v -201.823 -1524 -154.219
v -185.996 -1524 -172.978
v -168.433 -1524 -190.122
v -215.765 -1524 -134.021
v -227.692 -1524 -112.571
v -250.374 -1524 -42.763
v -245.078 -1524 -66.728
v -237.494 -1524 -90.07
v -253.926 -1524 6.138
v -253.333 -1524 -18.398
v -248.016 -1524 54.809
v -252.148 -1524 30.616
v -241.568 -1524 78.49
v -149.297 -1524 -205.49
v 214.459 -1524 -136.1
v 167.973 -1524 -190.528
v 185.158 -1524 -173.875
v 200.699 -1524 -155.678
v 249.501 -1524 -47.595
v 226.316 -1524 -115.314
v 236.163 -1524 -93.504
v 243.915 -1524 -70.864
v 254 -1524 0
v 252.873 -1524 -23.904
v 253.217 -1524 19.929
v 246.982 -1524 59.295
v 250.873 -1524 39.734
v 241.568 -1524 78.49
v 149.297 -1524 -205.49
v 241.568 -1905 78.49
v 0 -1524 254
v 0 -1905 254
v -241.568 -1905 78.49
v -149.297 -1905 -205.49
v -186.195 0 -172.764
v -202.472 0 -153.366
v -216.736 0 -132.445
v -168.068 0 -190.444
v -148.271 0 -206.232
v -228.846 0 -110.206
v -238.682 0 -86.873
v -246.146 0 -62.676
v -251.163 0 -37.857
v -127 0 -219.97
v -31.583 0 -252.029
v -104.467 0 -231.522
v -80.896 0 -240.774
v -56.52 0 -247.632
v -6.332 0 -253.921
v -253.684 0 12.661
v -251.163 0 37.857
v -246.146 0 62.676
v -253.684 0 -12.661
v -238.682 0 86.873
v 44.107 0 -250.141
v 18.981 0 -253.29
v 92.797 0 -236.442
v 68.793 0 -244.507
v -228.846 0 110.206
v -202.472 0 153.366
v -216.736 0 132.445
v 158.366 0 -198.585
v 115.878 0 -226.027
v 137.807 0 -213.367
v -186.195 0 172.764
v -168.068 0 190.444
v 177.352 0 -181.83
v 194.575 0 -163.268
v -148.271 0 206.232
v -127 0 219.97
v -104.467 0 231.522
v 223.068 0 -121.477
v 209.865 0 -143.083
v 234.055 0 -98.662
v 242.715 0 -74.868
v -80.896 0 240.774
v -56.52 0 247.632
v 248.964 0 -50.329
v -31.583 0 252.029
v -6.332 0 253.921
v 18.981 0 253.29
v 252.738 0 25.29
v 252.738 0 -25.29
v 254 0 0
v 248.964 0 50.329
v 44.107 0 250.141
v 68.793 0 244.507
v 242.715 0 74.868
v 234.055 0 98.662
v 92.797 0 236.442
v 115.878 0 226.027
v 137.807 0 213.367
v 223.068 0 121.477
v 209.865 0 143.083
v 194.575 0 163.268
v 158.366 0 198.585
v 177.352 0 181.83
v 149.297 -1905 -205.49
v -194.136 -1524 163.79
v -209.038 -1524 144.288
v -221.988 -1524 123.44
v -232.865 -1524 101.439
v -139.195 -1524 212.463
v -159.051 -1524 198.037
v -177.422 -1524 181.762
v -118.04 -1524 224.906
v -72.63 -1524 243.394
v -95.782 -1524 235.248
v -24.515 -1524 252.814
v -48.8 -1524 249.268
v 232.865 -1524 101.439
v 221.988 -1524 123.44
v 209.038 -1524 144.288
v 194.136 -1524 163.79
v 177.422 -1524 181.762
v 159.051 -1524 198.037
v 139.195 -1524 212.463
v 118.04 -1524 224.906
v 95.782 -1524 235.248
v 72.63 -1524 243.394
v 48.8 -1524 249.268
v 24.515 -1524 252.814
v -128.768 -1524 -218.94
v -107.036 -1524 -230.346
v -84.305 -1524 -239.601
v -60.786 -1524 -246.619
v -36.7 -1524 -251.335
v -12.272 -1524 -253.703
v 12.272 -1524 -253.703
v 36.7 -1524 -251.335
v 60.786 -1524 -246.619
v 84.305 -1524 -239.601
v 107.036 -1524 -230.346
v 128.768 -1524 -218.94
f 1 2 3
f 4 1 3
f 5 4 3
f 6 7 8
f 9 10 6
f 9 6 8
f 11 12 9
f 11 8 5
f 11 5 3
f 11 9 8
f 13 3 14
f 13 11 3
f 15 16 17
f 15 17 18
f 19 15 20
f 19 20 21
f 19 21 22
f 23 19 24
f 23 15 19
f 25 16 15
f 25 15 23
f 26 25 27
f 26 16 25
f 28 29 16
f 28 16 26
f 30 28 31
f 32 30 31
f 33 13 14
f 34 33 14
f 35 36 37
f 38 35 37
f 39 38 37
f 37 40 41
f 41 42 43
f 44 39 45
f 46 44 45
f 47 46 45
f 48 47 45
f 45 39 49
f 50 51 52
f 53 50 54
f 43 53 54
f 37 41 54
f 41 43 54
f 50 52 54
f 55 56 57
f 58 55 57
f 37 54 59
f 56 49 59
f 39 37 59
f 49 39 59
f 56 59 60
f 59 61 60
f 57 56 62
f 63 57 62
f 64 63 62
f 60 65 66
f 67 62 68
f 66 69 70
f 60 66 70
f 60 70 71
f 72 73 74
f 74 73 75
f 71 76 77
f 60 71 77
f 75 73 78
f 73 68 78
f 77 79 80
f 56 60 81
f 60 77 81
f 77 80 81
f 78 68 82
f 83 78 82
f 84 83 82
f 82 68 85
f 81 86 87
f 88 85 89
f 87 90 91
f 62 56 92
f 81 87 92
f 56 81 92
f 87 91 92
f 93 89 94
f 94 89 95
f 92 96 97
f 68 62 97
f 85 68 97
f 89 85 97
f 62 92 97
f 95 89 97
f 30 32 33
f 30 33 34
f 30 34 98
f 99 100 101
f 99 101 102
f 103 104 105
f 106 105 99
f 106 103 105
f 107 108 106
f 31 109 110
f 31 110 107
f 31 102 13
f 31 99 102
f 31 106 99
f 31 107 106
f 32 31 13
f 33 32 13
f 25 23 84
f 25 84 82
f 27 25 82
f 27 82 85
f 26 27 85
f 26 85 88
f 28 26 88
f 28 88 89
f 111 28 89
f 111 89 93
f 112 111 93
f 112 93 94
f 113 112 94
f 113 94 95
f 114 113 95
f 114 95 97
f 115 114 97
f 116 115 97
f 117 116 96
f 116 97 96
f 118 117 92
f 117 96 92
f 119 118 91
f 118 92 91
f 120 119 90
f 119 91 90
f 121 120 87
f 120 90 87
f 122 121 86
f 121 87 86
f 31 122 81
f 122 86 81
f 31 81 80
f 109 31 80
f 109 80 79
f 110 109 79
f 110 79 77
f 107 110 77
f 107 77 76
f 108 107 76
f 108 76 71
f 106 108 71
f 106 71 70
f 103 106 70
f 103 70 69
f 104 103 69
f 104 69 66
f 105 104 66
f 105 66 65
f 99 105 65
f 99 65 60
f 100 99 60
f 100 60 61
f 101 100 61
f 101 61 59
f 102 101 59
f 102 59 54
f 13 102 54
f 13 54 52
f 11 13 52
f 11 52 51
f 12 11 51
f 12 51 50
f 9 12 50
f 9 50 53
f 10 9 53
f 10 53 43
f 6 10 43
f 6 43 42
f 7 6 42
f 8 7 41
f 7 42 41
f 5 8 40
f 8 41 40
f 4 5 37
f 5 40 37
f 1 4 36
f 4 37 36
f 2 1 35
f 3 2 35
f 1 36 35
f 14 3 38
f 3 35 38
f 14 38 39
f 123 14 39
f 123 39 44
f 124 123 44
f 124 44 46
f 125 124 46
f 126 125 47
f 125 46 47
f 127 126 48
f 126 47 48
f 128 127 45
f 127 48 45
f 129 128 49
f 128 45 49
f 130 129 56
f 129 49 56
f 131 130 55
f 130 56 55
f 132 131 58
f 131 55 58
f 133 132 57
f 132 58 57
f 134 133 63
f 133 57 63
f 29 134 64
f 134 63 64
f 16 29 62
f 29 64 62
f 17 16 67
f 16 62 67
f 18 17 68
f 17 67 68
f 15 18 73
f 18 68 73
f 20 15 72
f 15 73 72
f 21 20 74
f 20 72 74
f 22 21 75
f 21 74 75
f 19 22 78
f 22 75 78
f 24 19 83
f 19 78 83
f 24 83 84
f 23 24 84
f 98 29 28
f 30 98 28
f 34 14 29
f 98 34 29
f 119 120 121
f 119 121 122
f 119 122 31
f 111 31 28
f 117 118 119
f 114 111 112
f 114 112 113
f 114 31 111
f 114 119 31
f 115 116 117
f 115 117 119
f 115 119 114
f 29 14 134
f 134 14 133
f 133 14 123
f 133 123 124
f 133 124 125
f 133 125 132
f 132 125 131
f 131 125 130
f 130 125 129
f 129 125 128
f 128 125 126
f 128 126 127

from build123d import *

# Parameters (mm, degrees)
F0_R     = 254
F1_DEPTH = 1524
F3_DEPTH = 381


with BuildPart() as f1:
    # F0 (on Front) → F1 (new body)
    with BuildSketch(Plane.XZ):
        Circle(F0_R)
    extrude(amount=F1_DEPTH)

    # F2 (on face) → F3 (join)
    with BuildSketch(Plane.XZ.offset(1524)):
        Polygon((241.568355, 78.490317), (0, 254), (-241.568355, 78.490317), (-149.297454, -205.490317), (149.297454, -205.490317), align=None)
    extrude(amount=F3_DEPTH)


solid = f1.part
